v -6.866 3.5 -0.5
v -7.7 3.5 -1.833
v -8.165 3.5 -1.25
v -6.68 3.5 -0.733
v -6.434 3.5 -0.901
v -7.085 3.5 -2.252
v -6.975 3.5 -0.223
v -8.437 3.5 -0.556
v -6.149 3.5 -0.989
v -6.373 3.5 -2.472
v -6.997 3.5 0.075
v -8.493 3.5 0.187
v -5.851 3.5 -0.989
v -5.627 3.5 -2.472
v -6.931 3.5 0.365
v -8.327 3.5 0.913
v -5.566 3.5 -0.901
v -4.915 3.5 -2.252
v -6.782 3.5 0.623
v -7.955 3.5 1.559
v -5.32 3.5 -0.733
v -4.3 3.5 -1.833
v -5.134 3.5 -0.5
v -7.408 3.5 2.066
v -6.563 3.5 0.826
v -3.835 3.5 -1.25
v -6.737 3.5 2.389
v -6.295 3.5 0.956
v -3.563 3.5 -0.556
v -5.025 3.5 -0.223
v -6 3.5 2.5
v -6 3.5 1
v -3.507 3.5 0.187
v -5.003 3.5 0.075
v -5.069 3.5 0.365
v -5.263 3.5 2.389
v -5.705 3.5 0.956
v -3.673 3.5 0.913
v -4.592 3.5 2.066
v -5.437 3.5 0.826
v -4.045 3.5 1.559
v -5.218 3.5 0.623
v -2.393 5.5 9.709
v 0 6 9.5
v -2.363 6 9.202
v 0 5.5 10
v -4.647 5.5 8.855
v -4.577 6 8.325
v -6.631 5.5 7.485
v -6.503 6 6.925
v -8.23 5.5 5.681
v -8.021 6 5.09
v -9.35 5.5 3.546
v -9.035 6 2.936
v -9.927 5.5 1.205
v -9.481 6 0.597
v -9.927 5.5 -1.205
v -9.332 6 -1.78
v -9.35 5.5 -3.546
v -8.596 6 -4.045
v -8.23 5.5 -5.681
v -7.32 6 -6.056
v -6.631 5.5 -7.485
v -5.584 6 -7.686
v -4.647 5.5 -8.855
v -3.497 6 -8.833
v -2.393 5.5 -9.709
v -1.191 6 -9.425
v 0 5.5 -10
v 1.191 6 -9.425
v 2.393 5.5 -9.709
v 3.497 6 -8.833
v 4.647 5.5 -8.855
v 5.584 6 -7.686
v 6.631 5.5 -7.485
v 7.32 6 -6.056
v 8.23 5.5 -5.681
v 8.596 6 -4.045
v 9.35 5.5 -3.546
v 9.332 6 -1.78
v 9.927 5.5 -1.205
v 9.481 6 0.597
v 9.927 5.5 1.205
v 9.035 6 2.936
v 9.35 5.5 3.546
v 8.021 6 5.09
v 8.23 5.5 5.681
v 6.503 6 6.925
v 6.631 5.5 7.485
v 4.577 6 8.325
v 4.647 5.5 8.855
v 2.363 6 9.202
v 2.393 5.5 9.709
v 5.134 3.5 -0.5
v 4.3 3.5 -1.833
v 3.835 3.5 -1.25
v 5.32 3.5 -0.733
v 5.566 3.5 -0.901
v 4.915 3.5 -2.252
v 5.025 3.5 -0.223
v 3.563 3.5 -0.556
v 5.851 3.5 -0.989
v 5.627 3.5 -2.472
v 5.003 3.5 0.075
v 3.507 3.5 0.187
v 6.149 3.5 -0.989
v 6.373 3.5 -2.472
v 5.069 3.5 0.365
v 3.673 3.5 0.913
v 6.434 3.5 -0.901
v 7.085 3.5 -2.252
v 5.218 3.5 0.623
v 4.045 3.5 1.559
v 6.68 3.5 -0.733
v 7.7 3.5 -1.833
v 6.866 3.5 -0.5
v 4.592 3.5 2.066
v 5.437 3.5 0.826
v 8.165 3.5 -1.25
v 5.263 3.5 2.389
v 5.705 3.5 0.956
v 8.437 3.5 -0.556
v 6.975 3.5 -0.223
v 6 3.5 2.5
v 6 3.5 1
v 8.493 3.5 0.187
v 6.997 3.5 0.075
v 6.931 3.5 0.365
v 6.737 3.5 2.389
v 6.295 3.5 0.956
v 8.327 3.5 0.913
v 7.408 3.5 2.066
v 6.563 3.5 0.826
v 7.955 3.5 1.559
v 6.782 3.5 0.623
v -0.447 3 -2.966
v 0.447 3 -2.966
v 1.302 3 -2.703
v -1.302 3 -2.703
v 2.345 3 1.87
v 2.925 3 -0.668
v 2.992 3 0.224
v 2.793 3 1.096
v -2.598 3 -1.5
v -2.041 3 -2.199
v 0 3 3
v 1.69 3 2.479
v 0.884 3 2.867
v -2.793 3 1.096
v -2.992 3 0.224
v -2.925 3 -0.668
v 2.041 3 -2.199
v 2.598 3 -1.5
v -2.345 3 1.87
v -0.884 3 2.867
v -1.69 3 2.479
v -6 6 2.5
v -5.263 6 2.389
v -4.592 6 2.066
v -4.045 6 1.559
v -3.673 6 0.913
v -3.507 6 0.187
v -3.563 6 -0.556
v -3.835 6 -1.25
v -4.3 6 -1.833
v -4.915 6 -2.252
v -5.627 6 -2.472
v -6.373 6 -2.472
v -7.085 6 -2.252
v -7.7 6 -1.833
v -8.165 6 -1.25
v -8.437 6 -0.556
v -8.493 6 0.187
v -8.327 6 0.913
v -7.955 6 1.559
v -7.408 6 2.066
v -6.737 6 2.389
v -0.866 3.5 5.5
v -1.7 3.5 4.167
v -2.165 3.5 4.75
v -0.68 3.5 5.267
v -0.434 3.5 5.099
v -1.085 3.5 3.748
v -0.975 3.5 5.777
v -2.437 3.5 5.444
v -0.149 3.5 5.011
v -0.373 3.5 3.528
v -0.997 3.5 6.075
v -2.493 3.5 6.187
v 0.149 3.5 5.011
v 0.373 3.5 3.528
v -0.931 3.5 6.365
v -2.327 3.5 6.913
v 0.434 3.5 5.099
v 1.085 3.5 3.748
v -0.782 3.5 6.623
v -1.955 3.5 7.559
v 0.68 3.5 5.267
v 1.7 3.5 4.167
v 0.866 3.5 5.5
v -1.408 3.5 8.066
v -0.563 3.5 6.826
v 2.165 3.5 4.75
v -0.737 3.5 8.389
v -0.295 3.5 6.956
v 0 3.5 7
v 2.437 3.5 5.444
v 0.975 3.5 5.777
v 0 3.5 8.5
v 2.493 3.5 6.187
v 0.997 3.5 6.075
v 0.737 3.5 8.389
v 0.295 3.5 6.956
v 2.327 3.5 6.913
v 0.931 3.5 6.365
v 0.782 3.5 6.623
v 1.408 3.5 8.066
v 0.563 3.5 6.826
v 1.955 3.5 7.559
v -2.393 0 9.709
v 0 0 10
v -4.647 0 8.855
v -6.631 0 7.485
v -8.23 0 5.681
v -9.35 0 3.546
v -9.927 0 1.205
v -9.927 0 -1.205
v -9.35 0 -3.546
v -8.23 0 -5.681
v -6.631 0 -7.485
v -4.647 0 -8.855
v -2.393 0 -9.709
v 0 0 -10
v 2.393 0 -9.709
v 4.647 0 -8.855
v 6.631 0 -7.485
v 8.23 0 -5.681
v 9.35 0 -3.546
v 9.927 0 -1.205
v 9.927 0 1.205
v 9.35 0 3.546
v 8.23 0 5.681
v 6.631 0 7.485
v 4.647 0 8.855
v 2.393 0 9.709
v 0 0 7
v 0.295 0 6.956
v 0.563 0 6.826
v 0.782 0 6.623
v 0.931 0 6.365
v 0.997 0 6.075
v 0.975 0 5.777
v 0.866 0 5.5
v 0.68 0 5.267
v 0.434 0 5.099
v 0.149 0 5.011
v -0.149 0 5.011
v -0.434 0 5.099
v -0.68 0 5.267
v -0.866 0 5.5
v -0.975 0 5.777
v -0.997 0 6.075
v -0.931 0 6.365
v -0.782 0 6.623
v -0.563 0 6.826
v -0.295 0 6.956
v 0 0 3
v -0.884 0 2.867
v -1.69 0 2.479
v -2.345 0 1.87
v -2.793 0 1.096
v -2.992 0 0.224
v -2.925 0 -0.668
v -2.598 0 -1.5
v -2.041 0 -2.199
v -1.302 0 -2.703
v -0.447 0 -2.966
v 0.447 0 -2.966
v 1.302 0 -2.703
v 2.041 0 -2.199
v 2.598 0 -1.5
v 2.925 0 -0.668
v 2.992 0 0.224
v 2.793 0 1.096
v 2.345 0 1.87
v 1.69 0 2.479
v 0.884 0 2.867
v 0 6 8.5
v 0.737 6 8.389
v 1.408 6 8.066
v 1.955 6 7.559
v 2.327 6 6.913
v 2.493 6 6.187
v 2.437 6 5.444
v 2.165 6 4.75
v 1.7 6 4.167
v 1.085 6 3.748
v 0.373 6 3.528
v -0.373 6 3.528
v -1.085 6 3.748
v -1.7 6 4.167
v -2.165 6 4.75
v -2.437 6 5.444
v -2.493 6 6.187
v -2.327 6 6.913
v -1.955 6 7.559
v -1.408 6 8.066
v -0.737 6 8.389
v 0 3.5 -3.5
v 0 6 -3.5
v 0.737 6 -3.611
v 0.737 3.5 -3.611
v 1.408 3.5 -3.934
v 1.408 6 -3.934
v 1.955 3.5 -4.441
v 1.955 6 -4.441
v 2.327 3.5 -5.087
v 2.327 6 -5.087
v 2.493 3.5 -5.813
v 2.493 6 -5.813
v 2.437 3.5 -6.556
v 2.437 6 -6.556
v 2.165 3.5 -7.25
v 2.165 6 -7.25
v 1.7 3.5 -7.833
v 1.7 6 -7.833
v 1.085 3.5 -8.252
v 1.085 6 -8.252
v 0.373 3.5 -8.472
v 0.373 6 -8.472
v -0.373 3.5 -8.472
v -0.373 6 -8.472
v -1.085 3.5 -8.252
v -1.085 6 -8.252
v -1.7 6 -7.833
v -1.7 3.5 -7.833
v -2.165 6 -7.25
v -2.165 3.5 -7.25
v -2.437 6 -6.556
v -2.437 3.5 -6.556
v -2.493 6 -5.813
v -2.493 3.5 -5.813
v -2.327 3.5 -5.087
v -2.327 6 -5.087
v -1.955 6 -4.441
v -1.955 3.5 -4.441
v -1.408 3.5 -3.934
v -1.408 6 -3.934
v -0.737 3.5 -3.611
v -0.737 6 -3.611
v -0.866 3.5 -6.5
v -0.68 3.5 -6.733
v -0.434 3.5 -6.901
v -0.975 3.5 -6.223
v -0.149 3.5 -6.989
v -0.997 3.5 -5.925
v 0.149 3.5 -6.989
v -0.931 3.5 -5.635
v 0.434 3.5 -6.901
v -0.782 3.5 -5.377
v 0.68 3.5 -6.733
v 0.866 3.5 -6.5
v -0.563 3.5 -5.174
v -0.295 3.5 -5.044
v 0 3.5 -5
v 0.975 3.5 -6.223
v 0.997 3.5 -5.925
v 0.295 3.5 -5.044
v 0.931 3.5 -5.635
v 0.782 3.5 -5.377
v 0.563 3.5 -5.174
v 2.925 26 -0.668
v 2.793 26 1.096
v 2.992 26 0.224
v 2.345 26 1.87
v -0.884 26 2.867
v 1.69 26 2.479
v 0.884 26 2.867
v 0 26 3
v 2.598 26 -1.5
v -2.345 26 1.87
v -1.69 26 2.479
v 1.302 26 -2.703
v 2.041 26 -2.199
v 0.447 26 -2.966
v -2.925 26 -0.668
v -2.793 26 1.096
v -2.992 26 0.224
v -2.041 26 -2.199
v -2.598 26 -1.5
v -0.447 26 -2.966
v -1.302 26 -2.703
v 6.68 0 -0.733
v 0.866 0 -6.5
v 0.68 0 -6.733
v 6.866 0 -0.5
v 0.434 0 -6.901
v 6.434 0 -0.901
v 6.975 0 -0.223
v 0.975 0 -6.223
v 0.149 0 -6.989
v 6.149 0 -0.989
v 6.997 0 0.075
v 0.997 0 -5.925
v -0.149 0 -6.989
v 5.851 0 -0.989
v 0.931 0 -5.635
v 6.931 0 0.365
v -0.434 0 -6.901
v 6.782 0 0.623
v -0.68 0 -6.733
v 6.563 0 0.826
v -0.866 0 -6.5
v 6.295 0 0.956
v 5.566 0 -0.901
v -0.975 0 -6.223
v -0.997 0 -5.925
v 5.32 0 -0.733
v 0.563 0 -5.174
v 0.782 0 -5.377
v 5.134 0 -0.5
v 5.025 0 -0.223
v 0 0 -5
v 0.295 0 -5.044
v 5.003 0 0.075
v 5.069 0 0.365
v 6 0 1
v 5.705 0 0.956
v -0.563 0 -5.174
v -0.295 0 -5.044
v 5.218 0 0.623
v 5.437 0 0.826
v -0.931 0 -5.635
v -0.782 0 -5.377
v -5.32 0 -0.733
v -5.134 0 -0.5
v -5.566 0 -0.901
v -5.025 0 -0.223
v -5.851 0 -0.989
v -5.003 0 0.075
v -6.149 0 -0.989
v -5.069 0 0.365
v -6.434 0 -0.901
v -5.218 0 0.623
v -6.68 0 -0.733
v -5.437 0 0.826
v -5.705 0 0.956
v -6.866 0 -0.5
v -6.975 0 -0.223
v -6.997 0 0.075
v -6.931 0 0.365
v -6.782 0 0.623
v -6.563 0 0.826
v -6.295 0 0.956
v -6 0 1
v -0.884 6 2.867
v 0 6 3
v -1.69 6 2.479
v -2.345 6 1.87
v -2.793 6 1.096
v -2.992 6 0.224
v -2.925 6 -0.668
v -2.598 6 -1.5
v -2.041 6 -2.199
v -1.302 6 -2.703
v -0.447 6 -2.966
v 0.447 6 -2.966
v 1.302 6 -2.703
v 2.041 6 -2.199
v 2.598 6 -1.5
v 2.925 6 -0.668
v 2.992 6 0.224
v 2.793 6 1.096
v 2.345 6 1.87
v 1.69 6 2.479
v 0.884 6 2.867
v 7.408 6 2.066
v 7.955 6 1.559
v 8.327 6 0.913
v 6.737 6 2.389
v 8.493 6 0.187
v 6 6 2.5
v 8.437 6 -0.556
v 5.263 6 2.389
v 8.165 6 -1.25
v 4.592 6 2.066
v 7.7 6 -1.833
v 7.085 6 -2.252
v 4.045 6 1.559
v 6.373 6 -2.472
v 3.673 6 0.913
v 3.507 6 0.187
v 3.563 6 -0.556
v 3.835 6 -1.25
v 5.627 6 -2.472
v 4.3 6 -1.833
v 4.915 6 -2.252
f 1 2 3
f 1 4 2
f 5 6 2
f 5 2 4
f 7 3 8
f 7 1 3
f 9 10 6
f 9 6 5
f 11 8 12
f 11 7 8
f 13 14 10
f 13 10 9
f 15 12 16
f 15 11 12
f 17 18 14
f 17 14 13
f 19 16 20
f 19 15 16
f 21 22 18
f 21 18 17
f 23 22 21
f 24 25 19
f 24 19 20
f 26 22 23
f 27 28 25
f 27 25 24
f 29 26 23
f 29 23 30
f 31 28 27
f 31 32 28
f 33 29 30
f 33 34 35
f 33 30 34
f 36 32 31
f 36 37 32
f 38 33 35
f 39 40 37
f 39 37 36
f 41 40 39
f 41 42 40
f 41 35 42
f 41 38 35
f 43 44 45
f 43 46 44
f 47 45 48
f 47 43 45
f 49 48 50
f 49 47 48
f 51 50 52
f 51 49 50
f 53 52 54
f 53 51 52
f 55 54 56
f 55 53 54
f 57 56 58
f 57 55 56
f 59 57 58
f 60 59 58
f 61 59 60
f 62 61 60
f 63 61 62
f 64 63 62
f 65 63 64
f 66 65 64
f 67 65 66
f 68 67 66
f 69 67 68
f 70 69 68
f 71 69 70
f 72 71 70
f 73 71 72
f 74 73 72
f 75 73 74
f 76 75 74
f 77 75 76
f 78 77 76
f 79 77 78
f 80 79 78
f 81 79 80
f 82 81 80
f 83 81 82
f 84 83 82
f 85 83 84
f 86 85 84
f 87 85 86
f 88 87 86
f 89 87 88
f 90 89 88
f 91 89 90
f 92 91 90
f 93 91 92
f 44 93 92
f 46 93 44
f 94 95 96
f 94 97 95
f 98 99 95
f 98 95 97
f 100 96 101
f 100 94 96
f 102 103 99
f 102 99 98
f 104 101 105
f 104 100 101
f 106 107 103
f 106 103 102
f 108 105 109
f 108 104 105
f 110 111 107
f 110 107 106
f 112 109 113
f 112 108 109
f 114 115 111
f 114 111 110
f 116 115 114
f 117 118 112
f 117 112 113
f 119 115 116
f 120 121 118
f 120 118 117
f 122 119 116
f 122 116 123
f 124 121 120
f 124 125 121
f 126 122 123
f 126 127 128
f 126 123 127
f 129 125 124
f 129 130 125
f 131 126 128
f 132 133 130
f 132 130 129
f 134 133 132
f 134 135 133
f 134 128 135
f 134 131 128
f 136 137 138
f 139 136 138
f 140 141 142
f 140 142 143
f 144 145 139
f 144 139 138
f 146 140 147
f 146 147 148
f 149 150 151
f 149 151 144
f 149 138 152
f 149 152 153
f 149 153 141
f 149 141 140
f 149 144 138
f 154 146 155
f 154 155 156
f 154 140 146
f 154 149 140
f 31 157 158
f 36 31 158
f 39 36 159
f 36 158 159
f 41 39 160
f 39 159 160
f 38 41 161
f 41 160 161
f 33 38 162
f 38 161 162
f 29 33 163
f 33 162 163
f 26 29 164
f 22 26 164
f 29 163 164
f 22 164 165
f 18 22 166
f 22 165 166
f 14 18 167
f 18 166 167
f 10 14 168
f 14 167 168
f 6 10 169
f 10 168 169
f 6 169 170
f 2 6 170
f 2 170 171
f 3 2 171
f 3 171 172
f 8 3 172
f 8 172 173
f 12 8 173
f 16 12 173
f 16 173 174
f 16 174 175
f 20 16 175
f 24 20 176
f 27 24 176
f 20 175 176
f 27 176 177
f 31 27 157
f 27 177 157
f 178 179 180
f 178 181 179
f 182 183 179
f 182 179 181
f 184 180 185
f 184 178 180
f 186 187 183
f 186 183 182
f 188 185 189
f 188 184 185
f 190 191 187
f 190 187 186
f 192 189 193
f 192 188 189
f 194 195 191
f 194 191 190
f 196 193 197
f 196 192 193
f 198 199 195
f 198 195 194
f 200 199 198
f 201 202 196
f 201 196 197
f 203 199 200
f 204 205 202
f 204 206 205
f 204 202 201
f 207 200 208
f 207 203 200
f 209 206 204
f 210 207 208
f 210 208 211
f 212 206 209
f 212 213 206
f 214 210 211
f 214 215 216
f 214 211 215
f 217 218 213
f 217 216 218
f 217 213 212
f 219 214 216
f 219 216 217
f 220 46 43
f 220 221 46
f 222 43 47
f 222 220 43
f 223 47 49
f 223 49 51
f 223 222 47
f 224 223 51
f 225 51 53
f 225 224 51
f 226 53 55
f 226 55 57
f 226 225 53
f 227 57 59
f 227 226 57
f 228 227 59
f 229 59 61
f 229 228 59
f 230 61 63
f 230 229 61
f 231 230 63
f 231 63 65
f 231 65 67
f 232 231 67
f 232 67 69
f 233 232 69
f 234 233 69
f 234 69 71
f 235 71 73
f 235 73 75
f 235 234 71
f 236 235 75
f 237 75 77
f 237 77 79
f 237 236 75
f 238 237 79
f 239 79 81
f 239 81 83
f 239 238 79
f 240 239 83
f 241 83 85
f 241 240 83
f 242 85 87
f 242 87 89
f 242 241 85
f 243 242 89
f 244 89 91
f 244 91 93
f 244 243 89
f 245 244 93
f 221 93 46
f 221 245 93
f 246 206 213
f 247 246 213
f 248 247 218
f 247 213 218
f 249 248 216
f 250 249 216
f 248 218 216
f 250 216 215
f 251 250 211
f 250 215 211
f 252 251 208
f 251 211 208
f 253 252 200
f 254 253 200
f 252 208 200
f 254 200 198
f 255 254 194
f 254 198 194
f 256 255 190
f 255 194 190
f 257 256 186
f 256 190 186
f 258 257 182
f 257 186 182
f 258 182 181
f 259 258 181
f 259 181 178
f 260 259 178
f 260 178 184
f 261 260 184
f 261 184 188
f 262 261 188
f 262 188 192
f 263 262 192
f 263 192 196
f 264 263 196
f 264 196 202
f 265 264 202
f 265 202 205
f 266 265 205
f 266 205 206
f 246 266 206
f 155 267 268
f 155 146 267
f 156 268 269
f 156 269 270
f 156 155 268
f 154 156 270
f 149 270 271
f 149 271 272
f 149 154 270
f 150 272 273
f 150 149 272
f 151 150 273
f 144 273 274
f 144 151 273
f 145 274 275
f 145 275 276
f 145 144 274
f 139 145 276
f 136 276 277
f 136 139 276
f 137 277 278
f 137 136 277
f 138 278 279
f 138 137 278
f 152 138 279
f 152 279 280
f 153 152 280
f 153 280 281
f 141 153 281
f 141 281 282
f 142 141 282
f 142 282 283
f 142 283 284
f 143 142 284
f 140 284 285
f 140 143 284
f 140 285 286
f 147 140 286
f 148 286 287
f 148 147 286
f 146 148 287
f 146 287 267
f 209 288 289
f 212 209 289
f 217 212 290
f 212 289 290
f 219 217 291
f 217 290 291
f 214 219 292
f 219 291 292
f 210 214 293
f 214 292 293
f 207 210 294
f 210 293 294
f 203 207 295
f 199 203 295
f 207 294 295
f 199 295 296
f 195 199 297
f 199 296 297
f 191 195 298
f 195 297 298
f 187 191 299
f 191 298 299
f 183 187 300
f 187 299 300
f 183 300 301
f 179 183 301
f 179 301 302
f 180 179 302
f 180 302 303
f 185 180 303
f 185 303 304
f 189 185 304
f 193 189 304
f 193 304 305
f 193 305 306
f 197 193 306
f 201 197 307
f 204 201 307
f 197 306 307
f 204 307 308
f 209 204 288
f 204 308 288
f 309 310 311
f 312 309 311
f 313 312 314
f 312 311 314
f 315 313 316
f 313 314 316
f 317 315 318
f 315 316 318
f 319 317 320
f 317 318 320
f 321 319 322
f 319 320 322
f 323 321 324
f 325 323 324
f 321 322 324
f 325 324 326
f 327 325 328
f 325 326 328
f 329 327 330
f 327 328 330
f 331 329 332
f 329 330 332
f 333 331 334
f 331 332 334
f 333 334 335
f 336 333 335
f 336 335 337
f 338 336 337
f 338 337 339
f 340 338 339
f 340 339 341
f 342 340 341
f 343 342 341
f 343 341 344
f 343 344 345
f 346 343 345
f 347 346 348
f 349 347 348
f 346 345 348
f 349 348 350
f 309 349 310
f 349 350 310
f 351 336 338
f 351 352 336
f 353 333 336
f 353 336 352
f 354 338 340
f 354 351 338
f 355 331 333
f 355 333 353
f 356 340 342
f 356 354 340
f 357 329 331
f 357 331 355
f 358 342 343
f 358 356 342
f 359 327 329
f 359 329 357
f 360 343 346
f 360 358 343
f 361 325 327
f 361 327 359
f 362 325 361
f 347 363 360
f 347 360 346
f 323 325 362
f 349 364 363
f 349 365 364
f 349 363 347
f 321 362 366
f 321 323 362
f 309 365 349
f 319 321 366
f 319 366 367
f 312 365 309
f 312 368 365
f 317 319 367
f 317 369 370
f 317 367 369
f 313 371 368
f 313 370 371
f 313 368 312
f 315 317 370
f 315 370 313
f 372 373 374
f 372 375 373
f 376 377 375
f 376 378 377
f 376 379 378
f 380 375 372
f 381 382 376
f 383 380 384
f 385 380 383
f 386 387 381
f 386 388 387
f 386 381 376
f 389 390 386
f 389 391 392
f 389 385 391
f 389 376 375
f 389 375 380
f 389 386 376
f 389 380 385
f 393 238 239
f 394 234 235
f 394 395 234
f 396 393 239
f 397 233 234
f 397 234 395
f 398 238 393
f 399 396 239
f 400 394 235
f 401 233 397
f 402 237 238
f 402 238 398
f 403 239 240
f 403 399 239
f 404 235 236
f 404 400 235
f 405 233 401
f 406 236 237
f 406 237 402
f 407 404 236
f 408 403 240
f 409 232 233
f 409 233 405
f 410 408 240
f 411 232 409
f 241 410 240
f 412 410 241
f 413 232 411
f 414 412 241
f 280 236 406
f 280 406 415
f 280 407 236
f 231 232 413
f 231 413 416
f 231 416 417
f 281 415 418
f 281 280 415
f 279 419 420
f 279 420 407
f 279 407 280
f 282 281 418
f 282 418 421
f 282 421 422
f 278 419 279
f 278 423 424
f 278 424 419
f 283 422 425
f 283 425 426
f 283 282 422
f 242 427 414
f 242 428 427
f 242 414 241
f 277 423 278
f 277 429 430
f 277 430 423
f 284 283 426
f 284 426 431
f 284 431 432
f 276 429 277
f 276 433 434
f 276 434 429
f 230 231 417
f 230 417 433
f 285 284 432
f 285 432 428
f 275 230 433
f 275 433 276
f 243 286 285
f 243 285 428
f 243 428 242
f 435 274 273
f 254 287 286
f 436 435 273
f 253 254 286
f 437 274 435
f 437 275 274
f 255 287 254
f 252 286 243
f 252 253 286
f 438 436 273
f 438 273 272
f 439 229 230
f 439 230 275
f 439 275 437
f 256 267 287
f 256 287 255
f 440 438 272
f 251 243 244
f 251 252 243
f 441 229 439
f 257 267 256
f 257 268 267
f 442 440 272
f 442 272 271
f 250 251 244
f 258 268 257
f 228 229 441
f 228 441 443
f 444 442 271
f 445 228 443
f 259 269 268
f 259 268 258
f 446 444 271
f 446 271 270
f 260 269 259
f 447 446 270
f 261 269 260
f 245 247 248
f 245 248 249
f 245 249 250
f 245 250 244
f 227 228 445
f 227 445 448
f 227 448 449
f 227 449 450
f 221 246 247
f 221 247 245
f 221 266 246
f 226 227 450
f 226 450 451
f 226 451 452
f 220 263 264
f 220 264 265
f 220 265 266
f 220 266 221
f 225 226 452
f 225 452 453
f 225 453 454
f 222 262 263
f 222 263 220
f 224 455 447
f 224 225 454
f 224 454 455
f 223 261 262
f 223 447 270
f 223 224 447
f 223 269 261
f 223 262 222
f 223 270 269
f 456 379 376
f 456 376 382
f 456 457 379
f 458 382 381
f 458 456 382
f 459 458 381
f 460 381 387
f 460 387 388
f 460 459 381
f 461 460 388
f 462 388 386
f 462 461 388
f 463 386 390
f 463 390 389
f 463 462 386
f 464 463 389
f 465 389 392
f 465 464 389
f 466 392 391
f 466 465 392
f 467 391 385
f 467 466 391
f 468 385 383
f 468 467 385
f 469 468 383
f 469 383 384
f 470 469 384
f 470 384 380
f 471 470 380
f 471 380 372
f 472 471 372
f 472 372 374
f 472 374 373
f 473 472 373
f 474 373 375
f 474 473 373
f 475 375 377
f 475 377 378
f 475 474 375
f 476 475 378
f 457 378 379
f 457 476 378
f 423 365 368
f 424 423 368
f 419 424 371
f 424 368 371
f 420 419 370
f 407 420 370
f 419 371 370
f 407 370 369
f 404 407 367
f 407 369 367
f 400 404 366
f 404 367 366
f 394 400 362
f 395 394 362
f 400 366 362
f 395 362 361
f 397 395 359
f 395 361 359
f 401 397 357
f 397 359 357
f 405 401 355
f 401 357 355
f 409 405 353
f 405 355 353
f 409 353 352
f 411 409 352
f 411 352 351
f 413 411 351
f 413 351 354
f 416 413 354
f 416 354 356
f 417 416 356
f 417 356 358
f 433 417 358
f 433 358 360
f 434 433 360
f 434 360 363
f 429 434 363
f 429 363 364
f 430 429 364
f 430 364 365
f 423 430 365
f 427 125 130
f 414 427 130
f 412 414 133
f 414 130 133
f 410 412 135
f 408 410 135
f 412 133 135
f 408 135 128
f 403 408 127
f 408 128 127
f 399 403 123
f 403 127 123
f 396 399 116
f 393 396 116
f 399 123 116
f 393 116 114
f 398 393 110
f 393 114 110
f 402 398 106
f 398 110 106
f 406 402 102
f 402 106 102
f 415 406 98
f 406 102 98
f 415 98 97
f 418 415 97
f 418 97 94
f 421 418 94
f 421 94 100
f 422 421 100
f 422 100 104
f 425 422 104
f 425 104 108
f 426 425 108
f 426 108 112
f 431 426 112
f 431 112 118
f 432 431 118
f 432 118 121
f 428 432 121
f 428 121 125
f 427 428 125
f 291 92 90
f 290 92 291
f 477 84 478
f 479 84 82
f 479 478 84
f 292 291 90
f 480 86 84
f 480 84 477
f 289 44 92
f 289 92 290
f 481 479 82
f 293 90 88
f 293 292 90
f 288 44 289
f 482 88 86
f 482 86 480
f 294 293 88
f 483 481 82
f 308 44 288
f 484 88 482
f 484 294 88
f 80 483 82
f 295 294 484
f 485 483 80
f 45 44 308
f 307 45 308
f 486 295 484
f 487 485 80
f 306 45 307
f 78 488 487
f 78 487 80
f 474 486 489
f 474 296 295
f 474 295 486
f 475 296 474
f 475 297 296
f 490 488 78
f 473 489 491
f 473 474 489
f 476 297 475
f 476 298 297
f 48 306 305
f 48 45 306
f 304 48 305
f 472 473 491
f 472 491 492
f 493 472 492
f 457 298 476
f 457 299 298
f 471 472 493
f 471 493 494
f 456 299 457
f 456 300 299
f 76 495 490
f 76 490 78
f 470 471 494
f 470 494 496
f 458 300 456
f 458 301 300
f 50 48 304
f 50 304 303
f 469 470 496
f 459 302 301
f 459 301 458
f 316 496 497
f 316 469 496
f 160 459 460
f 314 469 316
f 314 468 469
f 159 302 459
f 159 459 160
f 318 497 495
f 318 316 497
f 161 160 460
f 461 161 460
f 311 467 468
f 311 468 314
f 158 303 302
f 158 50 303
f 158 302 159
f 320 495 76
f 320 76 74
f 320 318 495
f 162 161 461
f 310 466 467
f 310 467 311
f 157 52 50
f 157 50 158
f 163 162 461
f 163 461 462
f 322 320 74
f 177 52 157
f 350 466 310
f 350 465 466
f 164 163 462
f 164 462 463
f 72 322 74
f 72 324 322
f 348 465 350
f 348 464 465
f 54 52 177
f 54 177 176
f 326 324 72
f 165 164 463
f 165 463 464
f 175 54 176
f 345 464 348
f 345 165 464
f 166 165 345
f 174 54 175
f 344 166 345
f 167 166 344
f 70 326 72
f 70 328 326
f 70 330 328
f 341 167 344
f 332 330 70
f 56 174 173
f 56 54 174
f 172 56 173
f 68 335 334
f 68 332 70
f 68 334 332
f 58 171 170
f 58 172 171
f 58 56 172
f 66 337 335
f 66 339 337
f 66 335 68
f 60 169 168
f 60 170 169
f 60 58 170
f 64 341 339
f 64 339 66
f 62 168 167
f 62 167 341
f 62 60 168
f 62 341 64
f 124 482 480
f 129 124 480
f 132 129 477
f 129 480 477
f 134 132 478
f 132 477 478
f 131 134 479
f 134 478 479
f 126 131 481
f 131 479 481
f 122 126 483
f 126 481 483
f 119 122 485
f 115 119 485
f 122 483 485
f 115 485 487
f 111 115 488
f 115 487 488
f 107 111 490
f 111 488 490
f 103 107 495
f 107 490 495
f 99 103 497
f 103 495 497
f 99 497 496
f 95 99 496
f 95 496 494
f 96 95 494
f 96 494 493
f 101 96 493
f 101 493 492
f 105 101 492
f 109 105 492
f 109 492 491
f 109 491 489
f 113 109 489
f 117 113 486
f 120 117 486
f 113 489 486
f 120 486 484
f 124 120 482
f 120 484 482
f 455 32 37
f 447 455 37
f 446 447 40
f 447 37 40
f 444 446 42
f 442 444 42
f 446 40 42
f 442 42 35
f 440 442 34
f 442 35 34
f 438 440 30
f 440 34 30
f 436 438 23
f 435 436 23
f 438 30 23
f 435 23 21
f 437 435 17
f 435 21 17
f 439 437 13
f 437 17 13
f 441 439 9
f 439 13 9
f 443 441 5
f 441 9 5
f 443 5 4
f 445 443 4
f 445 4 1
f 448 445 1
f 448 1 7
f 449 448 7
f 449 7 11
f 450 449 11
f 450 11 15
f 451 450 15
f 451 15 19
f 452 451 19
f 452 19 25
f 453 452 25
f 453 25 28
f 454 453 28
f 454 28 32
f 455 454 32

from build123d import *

# Parameters (mm, degrees)
SKETCH_2_R          = 1
CUT_EXTRUDE_1_DEPTH = 10
SKETCH_3_R          = 2.5
CUT_EXTRUDE_2_DEPTH = 2.5


with BuildPart() as part:
    # 草图1 → 旋转1 (revolve)
    with BuildSketch(Plane.XY, mode=Mode.PRIVATE) as revolve_1_sk:
        Polygon((0, 26), (3, 26), (3, 6), (9.5, 6), (10, 5.5), (10, 0), (3, 0), (3, 3), (0, 3), align=None)
    revolve(revolve_1_sk.sketch.rotate(Axis((0, 9.947317903, 0), (0, -1, 0)), 90), axis=Axis((0, 9.947317903, 0), (0, -1, 0)))

    # 草图2 → 切除-拉伸1 (cut)
    with BuildSketch(Plane(origin=(0, 6, 0), x_dir=(1, 0, 0), z_dir=(0, 1, 0))):
        with Locations(Location((0, 6, 0), (0, 0, 270))):
            Circle(SKETCH_2_R)
        with Locations(Location((6, 0, 0), (0, 0, 270))):
            Circle(SKETCH_2_R)
        with Locations(Location((0, -6, 0), (0, 0, 270))):
            Circle(SKETCH_2_R)
        with Locations(Location((-6, 0, 0), (0, 0, 270))):
            Circle(SKETCH_2_R)
    extrude(amount=-CUT_EXTRUDE_1_DEPTH, mode=Mode.SUBTRACT)

    # 草图3 → 切除-拉伸2 (cut)
    with BuildSketch(Plane(origin=(0, 6, 0), x_dir=(1, 0, 0), z_dir=(0, 1, 0))):
        with Locations(Location((0, 6, 0), (0, 0, 270))):
            Circle(SKETCH_3_R)
        with Locations(Location((6, 0, 0), (0, 0, 270))):
            Circle(SKETCH_3_R)
        with Locations(Location((0, -6, 0), (0, 0, 270))):
            Circle(SKETCH_3_R)
        with Locations(Location((-6, 0, 0), (0, 0, 270))):
            Circle(SKETCH_3_R)
    extrude(amount=-CUT_EXTRUDE_2_DEPTH, mode=Mode.SUBTRACT)


solid = part.part
